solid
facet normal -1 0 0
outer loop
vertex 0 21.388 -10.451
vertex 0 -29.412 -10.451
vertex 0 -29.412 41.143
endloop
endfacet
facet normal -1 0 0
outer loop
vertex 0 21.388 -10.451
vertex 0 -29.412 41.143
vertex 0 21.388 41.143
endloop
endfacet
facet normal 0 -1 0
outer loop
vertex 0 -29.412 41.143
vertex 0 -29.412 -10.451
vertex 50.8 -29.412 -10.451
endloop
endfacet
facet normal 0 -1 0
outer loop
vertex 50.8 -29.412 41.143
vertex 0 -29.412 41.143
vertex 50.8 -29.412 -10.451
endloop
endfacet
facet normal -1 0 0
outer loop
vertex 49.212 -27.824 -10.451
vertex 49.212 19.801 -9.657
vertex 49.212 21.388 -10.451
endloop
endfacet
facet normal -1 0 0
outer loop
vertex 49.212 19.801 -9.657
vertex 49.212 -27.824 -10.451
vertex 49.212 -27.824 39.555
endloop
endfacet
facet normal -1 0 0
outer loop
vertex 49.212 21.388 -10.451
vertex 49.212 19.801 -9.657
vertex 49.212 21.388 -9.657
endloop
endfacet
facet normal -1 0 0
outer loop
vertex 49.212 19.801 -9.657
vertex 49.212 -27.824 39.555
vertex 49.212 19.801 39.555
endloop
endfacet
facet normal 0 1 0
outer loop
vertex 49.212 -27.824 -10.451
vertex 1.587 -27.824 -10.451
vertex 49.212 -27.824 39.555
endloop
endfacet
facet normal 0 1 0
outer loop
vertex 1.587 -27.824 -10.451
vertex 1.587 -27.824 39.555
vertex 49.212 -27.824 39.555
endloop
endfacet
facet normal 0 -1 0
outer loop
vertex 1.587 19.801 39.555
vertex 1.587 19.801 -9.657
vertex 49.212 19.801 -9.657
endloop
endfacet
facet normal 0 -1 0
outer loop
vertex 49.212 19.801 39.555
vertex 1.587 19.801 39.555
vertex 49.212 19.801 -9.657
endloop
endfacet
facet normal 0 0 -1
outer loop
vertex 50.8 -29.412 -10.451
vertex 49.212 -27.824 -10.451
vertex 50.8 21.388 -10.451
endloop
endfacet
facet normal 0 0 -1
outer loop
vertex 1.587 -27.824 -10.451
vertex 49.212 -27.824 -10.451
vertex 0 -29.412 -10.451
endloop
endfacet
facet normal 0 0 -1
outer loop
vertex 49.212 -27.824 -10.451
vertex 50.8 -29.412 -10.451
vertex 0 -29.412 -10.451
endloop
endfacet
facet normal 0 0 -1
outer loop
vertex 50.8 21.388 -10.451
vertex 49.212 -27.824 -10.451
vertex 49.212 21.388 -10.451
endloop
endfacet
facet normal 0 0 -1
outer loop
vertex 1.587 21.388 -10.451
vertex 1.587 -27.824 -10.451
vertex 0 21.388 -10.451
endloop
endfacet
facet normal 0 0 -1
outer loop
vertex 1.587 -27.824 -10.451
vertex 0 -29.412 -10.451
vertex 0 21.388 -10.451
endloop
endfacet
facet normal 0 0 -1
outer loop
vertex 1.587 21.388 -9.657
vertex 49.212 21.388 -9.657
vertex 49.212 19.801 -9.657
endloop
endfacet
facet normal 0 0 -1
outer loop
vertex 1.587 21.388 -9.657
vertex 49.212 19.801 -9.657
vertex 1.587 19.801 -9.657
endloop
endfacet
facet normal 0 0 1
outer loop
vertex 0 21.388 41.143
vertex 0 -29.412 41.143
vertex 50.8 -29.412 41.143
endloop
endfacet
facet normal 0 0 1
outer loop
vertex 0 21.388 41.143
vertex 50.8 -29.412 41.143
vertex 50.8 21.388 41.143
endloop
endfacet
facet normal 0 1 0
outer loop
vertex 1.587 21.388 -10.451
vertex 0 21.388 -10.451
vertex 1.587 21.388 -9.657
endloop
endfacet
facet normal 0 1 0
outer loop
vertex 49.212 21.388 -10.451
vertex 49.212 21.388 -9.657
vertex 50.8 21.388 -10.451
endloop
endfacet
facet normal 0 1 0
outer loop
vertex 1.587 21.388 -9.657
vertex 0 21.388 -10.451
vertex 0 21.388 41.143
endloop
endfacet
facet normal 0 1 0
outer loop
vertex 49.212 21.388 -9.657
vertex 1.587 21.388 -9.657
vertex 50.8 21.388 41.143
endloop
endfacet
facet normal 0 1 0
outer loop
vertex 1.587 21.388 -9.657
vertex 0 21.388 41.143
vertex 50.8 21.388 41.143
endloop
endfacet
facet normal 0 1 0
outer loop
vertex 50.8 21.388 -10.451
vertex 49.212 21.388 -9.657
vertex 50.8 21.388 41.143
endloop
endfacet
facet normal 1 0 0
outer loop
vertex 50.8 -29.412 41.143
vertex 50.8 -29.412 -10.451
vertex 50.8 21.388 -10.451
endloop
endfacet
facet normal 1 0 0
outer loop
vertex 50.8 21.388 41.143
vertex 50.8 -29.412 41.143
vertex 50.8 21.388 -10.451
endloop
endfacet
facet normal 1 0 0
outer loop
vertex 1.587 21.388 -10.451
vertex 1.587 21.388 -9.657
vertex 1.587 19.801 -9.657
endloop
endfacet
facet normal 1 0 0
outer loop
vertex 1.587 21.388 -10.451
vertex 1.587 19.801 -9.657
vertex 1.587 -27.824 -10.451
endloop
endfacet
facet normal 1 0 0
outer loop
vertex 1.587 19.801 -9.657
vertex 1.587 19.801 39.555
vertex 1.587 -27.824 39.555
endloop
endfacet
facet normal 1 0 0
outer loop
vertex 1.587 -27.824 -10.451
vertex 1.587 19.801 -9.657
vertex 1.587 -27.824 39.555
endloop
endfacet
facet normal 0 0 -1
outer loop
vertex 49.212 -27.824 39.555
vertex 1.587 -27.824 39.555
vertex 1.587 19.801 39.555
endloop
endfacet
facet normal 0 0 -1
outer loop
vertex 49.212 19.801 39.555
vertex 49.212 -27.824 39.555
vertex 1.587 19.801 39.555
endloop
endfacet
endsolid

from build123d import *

# Parameters (mm, degrees)
F0_W     = 50.8
F0_H     = 50.8
F1_DEPTH = 50.8
F2_T     = -1.5875
F3_W     = 47.625
F3_H     = 0.79375
F4_DEPTH = 5.08
F7_DEPTH = 0.79375


# Not quite as in the source:
# - a length typed as a fraction of an inch, garbled in the dataset ("3 / 203.2 mm" for 3/8 in), is restored


with BuildPart() as f1:
    # F0 (on Right) → F1 (new body)
    with BuildSketch(Plane.YZ):
        with Locations((-4.0118778124, 15.742687114)):
            Rectangle(F0_W, F0_H)
    extrude(amount=F1_DEPTH)

    # F2
    f2_openings = [f1.faces().sort_by_distance(p)[0] for p in [
        (25.4, -4.011878, -9.657313),
    ]]
    offset(amount=F2_T, openings=f2_openings)

    # F3 (on face) → F4 (cut)
    with BuildSketch(Plane(origin=(0, 21.3881221876, 0), x_dir=(-1, 0, 0), z_dir=(0, 1, 0))):
        with Locations((-25.4, -9.260437886)):
            Rectangle(F3_W, F3_H)
    extrude(amount=-F4_DEPTH, mode=Mode.SUBTRACT)


with BuildPart() as f5_1:
    # F5: copy of F1
    add(f1.part)


with BuildPart() as f1_1:
    add(f1.part)

    # F7 (add): faces of the model
    f7_faces = [f1_1.faces().sort_by_distance(p)[0] for p in [
        (0.7184204897, -4.0118778124, -9.657312886),
        (25.4, 20.5943721876, -8.863562886),
    ]]
    extrude(f7_faces, amount=F7_DEPTH)


solid = f1_1.part
